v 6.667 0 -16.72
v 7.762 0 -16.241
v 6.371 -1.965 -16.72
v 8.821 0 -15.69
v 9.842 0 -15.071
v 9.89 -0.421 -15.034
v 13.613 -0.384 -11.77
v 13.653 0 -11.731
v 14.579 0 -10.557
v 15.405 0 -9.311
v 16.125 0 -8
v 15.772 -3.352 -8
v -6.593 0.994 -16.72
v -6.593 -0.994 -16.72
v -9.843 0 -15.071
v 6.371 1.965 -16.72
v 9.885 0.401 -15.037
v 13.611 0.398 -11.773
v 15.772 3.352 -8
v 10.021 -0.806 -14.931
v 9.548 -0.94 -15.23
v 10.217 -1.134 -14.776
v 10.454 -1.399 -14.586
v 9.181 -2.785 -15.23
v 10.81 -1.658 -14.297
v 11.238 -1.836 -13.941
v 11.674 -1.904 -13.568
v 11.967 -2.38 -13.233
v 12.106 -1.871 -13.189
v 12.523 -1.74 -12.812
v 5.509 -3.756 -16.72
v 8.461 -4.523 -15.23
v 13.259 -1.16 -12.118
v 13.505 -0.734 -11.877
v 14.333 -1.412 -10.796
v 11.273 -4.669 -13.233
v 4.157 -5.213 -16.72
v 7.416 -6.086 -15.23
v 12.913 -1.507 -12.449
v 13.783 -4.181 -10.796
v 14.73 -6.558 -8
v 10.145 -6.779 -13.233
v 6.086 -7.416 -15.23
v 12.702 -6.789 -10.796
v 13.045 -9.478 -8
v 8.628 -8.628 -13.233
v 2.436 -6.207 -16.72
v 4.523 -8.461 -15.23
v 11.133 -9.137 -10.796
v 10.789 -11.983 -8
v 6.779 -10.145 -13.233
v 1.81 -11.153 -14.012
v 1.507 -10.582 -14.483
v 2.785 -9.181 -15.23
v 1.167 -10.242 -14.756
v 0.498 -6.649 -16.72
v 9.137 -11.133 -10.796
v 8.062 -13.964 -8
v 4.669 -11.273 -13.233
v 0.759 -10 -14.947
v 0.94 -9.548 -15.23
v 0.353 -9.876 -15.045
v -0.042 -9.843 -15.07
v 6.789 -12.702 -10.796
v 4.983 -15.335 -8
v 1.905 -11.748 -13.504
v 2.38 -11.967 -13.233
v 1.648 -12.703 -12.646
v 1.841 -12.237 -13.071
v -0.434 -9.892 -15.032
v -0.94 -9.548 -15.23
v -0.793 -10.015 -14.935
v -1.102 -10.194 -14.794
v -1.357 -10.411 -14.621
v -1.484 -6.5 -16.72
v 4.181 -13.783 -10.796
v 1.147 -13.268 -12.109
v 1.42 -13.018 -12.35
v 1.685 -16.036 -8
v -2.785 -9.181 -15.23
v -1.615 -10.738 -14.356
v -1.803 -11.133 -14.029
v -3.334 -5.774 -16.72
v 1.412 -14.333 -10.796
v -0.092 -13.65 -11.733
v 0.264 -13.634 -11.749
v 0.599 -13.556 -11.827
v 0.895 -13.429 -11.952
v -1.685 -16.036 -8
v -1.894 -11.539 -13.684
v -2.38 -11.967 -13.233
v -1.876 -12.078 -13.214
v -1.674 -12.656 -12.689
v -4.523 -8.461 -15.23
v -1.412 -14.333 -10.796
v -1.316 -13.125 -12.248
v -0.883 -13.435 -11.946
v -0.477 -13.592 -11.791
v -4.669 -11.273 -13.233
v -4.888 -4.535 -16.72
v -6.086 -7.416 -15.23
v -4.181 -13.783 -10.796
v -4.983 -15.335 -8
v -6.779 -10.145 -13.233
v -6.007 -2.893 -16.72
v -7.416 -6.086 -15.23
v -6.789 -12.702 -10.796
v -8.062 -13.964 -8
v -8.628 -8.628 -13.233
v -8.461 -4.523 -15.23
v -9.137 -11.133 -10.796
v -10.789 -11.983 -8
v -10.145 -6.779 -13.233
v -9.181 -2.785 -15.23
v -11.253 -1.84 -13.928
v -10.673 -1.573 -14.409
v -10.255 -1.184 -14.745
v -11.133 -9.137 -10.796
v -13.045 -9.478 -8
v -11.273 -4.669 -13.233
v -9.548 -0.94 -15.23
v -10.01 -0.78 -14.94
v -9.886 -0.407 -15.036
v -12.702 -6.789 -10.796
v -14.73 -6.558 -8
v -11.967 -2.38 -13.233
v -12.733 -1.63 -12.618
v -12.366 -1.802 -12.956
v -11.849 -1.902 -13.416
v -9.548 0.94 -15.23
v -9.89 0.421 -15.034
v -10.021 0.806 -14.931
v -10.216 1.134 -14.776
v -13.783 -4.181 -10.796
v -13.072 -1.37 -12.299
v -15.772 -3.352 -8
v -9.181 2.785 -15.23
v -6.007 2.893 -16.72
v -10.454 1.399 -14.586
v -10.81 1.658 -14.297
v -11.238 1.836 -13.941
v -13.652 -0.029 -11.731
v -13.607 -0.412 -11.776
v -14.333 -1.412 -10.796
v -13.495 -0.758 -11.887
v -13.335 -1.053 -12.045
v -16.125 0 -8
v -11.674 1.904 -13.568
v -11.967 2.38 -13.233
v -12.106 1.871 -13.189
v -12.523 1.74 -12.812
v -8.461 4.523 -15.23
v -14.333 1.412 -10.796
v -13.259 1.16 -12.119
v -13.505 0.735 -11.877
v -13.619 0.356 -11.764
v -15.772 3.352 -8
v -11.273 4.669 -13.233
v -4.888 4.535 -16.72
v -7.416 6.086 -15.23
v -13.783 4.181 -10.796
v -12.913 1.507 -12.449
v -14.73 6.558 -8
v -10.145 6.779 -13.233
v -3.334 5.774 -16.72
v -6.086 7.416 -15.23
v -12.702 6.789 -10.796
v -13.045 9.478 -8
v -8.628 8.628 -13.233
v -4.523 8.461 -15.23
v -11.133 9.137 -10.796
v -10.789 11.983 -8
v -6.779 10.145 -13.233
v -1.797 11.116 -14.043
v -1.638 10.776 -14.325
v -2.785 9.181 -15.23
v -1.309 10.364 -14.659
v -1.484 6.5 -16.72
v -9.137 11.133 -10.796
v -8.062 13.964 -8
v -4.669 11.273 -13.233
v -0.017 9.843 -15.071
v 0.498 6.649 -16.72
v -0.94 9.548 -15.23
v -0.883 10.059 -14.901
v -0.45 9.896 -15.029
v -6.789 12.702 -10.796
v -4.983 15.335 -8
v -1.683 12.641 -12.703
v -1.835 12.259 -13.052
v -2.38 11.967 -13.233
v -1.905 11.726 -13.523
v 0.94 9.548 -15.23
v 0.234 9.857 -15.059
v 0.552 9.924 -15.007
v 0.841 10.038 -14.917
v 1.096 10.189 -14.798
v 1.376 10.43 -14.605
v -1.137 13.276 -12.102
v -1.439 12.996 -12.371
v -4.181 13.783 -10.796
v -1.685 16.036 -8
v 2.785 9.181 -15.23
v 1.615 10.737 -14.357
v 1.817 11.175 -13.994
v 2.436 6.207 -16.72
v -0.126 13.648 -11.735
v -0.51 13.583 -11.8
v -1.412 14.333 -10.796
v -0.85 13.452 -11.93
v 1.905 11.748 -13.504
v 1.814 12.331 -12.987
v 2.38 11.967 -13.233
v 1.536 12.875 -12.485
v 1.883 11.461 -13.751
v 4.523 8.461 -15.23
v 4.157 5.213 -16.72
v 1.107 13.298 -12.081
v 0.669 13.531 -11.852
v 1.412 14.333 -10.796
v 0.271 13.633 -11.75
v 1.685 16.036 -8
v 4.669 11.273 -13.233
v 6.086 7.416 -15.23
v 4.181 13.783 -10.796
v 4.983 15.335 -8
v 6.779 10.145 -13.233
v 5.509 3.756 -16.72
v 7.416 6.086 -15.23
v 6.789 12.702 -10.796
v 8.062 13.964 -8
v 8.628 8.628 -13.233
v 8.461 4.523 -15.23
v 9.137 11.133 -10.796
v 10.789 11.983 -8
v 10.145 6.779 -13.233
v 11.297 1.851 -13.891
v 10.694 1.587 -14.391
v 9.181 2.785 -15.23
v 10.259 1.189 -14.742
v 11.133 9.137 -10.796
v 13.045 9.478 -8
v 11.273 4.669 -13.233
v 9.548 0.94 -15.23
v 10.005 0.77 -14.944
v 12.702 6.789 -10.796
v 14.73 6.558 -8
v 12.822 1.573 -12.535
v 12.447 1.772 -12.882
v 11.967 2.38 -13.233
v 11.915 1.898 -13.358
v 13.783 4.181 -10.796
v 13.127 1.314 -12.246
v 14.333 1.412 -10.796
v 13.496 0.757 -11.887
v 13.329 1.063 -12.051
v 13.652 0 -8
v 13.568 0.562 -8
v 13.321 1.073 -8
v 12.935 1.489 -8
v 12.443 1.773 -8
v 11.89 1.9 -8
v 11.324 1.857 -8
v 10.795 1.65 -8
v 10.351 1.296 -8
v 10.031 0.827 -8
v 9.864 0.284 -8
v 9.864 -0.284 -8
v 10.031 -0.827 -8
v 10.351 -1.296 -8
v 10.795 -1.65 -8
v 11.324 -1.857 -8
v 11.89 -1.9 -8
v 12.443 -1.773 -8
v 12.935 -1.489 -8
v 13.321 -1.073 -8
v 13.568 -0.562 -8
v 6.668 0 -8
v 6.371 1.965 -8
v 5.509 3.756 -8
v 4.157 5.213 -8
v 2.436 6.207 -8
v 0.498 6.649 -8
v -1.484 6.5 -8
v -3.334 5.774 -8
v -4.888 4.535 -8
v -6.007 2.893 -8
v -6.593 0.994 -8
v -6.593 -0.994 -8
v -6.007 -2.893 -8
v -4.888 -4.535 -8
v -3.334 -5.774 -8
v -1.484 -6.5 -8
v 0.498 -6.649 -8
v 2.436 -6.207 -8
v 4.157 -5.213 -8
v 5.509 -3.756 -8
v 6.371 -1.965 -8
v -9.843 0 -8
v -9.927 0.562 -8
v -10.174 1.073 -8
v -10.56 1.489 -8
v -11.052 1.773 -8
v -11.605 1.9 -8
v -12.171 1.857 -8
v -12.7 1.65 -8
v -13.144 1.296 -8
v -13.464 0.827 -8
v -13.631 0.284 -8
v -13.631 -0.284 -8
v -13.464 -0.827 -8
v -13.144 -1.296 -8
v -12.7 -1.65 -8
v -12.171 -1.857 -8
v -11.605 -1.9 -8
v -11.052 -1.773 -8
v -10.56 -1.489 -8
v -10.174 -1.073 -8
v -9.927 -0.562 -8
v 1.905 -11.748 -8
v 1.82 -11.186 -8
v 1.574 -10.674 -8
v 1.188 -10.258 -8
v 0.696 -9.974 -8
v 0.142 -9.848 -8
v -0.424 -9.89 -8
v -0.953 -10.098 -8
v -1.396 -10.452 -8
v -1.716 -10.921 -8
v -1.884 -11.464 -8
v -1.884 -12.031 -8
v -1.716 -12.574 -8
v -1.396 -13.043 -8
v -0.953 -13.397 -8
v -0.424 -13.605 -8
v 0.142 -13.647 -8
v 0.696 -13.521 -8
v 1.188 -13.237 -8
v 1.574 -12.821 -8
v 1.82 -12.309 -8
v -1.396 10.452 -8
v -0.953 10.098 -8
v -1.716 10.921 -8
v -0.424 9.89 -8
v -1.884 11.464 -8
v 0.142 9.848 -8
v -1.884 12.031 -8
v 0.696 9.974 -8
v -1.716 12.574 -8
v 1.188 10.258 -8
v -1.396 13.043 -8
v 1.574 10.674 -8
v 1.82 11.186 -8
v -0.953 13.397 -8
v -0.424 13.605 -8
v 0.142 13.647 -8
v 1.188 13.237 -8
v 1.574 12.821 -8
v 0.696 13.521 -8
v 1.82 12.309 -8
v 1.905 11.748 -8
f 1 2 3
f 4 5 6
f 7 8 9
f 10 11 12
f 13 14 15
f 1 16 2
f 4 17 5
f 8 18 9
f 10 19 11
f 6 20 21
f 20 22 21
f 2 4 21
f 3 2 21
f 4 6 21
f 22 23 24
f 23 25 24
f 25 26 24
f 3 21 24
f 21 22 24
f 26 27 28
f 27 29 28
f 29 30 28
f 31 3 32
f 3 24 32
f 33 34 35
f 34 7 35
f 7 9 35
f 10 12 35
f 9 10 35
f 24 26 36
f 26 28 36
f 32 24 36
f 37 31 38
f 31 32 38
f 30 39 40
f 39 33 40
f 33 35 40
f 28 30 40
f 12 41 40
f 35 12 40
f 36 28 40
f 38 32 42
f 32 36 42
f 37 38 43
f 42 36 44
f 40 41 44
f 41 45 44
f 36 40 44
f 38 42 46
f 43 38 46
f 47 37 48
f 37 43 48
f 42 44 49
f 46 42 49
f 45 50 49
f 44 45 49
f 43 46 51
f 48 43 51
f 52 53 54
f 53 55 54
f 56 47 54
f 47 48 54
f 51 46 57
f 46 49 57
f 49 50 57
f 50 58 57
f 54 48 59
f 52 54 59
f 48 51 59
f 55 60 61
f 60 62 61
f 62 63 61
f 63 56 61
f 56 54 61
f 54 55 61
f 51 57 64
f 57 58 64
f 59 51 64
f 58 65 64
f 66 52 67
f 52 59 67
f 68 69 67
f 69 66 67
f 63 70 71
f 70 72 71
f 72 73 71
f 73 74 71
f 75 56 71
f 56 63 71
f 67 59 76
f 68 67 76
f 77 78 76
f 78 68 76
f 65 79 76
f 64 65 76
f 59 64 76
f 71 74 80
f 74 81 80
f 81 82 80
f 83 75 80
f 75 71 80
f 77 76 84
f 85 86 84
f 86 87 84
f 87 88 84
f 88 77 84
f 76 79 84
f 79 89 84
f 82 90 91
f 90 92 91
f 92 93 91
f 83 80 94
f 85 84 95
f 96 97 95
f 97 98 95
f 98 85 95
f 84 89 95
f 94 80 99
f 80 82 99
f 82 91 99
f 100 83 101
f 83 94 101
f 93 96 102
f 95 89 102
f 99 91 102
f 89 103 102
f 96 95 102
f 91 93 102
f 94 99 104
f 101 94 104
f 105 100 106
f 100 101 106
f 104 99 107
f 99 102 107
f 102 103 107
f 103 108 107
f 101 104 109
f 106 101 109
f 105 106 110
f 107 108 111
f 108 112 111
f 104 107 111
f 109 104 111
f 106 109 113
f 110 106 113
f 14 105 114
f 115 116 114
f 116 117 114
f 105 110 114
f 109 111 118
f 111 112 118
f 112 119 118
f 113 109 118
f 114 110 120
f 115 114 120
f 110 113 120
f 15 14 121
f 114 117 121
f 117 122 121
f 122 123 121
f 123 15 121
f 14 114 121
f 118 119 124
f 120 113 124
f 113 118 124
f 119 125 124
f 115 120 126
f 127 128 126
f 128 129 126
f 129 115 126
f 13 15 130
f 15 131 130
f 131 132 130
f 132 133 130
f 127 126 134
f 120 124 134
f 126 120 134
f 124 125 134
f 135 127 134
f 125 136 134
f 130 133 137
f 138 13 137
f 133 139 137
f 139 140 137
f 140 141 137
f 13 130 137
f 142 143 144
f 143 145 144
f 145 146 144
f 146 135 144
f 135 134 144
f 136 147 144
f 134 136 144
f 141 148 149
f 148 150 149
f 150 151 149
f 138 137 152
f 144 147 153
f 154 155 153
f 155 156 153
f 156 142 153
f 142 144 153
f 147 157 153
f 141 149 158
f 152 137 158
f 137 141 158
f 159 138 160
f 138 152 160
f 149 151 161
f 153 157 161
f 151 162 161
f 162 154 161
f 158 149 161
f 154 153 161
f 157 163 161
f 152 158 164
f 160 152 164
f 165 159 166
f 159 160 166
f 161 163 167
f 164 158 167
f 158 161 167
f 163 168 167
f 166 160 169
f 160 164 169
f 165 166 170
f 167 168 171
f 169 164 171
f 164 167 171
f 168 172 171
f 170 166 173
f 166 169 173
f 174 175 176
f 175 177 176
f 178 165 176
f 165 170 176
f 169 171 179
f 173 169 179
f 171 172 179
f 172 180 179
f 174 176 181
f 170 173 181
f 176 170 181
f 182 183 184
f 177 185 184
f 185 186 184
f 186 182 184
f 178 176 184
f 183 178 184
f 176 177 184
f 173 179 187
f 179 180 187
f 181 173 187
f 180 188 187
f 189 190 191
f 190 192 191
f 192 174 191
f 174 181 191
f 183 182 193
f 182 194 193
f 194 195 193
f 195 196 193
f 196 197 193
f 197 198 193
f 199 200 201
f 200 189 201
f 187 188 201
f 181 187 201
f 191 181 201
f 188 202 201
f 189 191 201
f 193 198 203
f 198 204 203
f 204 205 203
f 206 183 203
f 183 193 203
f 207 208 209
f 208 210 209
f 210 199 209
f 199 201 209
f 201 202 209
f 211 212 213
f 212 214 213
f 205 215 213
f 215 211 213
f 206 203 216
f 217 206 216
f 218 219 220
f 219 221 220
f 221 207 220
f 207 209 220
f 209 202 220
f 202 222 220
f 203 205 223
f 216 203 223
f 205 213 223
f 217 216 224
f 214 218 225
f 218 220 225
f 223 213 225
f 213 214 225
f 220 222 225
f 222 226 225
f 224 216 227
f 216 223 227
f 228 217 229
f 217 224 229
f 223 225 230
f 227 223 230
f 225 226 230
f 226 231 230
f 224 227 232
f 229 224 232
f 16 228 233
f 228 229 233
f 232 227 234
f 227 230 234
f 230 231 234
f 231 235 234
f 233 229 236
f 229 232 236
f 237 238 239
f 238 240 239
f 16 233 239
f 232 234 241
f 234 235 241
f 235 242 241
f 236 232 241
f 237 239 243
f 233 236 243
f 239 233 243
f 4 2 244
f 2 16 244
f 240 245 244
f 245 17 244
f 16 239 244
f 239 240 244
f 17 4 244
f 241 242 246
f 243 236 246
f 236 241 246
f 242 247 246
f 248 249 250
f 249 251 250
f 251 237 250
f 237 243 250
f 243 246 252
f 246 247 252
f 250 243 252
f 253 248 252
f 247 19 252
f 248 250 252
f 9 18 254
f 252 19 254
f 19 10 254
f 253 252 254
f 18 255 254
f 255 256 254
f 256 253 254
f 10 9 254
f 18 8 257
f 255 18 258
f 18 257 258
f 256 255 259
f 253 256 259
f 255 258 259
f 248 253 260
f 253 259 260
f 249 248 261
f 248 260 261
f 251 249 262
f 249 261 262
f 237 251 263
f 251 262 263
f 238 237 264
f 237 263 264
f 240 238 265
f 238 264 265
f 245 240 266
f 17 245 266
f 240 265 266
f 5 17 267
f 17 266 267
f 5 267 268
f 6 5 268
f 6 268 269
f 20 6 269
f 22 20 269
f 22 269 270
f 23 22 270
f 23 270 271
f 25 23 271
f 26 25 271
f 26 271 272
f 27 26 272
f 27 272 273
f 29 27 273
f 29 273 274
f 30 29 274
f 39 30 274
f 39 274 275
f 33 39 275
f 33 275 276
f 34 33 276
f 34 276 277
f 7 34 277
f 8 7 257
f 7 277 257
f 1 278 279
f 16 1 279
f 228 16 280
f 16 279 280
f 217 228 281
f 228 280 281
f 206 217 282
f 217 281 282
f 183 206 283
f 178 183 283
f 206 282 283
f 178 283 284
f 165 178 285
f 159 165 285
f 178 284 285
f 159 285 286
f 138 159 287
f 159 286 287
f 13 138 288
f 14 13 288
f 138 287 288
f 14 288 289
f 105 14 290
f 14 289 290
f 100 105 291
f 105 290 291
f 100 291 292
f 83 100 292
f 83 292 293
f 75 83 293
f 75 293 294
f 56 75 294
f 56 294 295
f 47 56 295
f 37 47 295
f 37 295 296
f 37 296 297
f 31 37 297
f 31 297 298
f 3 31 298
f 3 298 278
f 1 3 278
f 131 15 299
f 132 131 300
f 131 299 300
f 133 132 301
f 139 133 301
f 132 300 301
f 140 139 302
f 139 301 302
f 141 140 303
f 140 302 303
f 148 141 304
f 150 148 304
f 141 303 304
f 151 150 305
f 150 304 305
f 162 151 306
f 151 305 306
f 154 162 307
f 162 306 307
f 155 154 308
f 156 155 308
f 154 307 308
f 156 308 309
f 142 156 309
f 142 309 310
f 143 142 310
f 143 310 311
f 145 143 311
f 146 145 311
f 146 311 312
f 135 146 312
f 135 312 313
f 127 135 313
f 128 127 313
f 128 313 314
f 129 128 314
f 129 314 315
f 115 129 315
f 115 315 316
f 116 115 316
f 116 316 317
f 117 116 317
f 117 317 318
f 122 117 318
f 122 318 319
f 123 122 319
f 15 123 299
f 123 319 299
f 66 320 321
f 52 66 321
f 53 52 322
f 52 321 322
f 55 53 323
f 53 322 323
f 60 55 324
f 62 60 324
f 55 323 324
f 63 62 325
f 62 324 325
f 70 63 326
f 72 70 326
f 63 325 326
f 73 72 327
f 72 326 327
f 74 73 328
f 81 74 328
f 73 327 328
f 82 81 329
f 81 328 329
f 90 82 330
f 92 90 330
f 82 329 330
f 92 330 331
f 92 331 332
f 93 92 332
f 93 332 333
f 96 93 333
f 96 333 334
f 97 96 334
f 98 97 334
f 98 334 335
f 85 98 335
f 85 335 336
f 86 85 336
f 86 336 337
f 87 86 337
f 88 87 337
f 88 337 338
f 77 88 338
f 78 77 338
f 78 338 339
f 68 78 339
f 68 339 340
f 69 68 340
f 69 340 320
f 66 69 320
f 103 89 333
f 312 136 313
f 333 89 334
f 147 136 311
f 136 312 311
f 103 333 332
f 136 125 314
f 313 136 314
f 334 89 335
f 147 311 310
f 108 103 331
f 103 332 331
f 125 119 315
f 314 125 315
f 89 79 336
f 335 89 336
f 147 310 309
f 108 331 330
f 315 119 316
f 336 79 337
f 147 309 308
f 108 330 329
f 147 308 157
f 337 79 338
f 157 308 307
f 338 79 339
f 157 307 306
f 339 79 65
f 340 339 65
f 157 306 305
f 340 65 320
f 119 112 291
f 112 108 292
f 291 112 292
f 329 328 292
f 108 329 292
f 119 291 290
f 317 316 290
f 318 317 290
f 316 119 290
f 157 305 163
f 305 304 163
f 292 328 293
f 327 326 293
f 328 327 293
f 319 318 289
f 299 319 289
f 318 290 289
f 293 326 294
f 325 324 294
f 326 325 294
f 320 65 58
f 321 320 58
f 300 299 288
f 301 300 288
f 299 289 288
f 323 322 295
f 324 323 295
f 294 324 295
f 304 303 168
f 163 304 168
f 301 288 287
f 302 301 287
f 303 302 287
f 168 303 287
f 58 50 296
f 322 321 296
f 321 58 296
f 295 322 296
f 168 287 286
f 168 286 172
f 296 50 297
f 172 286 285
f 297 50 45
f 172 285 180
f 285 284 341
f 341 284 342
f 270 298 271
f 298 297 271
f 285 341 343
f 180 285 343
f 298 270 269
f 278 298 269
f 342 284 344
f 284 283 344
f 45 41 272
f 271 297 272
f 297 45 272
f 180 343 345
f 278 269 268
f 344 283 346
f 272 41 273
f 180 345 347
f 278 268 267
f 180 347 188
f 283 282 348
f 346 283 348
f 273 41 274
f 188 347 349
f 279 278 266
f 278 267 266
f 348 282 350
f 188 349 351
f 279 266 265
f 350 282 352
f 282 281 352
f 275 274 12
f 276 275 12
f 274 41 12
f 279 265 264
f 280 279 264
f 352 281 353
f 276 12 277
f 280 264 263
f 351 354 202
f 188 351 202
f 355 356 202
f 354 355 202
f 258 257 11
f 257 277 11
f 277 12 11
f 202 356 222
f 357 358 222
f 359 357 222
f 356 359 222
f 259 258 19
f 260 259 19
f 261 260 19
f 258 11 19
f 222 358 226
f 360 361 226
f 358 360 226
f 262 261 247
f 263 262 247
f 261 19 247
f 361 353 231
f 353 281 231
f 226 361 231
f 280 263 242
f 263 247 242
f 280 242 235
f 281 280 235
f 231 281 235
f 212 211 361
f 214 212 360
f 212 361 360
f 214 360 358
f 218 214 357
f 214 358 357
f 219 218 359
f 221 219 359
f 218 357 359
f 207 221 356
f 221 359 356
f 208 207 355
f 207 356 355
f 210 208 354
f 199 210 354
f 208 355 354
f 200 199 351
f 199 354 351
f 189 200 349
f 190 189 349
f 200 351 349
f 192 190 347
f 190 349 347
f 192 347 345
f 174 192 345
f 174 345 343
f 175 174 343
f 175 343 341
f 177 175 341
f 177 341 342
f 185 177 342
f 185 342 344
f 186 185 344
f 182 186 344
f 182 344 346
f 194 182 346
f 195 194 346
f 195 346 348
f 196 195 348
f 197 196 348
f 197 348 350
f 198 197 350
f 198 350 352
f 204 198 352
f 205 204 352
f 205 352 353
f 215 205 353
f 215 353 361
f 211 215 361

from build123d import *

# Parameters (mm, degrees)
F3_DEPTH = 18
F4_R     = 1.905
F4_R_2   = 6.6675
F5_DEPTH = 10.001


# Not quite as in the source:
# - a feature names something its author has since deleted; it is built from what else it names


with BuildPart() as f1:
    # F0 (on Front) → F1 (revolve)
    with BuildSketch(Plane.XZ):
        with BuildLine():
            Line((0, 18), (0, -18))
            ThreePointArc((0, -18), (18, 0), (0, 18))
        make_face()
    revolve(axis=Axis((0, 0, 0), (0, 0, -1)))

    # F2 (on Right) → F3 (cut, symmetric)
    with BuildSketch(Plane.YZ):
        with BuildLine():
            Line((-16.1245154966, -8), (16.1245154966, -8))
            ThreePointArc((16.1245154966, -8), (0, 18), (-16.1245154966, -8))
        make_face()
    extrude(amount=F3_DEPTH, both=True, mode=Mode.SUBTRACT)

    # F4 (on face) → F5 (cut, through all)
    with BuildSketch(Plane.XY.offset(-8)):
        with Locations((0, -11.7475)):
            Circle(F4_R)
        with Locations((11.7475, 0)):
            Circle(F4_R)
        with Locations((0, 11.7475)):
            Circle(F4_R)
        with Locations((-11.7475, 0)):
            Circle(F4_R)
        Circle(F4_R_2)
    extrude(amount=-F5_DEPTH, mode=Mode.SUBTRACT)


solid = f1.part
